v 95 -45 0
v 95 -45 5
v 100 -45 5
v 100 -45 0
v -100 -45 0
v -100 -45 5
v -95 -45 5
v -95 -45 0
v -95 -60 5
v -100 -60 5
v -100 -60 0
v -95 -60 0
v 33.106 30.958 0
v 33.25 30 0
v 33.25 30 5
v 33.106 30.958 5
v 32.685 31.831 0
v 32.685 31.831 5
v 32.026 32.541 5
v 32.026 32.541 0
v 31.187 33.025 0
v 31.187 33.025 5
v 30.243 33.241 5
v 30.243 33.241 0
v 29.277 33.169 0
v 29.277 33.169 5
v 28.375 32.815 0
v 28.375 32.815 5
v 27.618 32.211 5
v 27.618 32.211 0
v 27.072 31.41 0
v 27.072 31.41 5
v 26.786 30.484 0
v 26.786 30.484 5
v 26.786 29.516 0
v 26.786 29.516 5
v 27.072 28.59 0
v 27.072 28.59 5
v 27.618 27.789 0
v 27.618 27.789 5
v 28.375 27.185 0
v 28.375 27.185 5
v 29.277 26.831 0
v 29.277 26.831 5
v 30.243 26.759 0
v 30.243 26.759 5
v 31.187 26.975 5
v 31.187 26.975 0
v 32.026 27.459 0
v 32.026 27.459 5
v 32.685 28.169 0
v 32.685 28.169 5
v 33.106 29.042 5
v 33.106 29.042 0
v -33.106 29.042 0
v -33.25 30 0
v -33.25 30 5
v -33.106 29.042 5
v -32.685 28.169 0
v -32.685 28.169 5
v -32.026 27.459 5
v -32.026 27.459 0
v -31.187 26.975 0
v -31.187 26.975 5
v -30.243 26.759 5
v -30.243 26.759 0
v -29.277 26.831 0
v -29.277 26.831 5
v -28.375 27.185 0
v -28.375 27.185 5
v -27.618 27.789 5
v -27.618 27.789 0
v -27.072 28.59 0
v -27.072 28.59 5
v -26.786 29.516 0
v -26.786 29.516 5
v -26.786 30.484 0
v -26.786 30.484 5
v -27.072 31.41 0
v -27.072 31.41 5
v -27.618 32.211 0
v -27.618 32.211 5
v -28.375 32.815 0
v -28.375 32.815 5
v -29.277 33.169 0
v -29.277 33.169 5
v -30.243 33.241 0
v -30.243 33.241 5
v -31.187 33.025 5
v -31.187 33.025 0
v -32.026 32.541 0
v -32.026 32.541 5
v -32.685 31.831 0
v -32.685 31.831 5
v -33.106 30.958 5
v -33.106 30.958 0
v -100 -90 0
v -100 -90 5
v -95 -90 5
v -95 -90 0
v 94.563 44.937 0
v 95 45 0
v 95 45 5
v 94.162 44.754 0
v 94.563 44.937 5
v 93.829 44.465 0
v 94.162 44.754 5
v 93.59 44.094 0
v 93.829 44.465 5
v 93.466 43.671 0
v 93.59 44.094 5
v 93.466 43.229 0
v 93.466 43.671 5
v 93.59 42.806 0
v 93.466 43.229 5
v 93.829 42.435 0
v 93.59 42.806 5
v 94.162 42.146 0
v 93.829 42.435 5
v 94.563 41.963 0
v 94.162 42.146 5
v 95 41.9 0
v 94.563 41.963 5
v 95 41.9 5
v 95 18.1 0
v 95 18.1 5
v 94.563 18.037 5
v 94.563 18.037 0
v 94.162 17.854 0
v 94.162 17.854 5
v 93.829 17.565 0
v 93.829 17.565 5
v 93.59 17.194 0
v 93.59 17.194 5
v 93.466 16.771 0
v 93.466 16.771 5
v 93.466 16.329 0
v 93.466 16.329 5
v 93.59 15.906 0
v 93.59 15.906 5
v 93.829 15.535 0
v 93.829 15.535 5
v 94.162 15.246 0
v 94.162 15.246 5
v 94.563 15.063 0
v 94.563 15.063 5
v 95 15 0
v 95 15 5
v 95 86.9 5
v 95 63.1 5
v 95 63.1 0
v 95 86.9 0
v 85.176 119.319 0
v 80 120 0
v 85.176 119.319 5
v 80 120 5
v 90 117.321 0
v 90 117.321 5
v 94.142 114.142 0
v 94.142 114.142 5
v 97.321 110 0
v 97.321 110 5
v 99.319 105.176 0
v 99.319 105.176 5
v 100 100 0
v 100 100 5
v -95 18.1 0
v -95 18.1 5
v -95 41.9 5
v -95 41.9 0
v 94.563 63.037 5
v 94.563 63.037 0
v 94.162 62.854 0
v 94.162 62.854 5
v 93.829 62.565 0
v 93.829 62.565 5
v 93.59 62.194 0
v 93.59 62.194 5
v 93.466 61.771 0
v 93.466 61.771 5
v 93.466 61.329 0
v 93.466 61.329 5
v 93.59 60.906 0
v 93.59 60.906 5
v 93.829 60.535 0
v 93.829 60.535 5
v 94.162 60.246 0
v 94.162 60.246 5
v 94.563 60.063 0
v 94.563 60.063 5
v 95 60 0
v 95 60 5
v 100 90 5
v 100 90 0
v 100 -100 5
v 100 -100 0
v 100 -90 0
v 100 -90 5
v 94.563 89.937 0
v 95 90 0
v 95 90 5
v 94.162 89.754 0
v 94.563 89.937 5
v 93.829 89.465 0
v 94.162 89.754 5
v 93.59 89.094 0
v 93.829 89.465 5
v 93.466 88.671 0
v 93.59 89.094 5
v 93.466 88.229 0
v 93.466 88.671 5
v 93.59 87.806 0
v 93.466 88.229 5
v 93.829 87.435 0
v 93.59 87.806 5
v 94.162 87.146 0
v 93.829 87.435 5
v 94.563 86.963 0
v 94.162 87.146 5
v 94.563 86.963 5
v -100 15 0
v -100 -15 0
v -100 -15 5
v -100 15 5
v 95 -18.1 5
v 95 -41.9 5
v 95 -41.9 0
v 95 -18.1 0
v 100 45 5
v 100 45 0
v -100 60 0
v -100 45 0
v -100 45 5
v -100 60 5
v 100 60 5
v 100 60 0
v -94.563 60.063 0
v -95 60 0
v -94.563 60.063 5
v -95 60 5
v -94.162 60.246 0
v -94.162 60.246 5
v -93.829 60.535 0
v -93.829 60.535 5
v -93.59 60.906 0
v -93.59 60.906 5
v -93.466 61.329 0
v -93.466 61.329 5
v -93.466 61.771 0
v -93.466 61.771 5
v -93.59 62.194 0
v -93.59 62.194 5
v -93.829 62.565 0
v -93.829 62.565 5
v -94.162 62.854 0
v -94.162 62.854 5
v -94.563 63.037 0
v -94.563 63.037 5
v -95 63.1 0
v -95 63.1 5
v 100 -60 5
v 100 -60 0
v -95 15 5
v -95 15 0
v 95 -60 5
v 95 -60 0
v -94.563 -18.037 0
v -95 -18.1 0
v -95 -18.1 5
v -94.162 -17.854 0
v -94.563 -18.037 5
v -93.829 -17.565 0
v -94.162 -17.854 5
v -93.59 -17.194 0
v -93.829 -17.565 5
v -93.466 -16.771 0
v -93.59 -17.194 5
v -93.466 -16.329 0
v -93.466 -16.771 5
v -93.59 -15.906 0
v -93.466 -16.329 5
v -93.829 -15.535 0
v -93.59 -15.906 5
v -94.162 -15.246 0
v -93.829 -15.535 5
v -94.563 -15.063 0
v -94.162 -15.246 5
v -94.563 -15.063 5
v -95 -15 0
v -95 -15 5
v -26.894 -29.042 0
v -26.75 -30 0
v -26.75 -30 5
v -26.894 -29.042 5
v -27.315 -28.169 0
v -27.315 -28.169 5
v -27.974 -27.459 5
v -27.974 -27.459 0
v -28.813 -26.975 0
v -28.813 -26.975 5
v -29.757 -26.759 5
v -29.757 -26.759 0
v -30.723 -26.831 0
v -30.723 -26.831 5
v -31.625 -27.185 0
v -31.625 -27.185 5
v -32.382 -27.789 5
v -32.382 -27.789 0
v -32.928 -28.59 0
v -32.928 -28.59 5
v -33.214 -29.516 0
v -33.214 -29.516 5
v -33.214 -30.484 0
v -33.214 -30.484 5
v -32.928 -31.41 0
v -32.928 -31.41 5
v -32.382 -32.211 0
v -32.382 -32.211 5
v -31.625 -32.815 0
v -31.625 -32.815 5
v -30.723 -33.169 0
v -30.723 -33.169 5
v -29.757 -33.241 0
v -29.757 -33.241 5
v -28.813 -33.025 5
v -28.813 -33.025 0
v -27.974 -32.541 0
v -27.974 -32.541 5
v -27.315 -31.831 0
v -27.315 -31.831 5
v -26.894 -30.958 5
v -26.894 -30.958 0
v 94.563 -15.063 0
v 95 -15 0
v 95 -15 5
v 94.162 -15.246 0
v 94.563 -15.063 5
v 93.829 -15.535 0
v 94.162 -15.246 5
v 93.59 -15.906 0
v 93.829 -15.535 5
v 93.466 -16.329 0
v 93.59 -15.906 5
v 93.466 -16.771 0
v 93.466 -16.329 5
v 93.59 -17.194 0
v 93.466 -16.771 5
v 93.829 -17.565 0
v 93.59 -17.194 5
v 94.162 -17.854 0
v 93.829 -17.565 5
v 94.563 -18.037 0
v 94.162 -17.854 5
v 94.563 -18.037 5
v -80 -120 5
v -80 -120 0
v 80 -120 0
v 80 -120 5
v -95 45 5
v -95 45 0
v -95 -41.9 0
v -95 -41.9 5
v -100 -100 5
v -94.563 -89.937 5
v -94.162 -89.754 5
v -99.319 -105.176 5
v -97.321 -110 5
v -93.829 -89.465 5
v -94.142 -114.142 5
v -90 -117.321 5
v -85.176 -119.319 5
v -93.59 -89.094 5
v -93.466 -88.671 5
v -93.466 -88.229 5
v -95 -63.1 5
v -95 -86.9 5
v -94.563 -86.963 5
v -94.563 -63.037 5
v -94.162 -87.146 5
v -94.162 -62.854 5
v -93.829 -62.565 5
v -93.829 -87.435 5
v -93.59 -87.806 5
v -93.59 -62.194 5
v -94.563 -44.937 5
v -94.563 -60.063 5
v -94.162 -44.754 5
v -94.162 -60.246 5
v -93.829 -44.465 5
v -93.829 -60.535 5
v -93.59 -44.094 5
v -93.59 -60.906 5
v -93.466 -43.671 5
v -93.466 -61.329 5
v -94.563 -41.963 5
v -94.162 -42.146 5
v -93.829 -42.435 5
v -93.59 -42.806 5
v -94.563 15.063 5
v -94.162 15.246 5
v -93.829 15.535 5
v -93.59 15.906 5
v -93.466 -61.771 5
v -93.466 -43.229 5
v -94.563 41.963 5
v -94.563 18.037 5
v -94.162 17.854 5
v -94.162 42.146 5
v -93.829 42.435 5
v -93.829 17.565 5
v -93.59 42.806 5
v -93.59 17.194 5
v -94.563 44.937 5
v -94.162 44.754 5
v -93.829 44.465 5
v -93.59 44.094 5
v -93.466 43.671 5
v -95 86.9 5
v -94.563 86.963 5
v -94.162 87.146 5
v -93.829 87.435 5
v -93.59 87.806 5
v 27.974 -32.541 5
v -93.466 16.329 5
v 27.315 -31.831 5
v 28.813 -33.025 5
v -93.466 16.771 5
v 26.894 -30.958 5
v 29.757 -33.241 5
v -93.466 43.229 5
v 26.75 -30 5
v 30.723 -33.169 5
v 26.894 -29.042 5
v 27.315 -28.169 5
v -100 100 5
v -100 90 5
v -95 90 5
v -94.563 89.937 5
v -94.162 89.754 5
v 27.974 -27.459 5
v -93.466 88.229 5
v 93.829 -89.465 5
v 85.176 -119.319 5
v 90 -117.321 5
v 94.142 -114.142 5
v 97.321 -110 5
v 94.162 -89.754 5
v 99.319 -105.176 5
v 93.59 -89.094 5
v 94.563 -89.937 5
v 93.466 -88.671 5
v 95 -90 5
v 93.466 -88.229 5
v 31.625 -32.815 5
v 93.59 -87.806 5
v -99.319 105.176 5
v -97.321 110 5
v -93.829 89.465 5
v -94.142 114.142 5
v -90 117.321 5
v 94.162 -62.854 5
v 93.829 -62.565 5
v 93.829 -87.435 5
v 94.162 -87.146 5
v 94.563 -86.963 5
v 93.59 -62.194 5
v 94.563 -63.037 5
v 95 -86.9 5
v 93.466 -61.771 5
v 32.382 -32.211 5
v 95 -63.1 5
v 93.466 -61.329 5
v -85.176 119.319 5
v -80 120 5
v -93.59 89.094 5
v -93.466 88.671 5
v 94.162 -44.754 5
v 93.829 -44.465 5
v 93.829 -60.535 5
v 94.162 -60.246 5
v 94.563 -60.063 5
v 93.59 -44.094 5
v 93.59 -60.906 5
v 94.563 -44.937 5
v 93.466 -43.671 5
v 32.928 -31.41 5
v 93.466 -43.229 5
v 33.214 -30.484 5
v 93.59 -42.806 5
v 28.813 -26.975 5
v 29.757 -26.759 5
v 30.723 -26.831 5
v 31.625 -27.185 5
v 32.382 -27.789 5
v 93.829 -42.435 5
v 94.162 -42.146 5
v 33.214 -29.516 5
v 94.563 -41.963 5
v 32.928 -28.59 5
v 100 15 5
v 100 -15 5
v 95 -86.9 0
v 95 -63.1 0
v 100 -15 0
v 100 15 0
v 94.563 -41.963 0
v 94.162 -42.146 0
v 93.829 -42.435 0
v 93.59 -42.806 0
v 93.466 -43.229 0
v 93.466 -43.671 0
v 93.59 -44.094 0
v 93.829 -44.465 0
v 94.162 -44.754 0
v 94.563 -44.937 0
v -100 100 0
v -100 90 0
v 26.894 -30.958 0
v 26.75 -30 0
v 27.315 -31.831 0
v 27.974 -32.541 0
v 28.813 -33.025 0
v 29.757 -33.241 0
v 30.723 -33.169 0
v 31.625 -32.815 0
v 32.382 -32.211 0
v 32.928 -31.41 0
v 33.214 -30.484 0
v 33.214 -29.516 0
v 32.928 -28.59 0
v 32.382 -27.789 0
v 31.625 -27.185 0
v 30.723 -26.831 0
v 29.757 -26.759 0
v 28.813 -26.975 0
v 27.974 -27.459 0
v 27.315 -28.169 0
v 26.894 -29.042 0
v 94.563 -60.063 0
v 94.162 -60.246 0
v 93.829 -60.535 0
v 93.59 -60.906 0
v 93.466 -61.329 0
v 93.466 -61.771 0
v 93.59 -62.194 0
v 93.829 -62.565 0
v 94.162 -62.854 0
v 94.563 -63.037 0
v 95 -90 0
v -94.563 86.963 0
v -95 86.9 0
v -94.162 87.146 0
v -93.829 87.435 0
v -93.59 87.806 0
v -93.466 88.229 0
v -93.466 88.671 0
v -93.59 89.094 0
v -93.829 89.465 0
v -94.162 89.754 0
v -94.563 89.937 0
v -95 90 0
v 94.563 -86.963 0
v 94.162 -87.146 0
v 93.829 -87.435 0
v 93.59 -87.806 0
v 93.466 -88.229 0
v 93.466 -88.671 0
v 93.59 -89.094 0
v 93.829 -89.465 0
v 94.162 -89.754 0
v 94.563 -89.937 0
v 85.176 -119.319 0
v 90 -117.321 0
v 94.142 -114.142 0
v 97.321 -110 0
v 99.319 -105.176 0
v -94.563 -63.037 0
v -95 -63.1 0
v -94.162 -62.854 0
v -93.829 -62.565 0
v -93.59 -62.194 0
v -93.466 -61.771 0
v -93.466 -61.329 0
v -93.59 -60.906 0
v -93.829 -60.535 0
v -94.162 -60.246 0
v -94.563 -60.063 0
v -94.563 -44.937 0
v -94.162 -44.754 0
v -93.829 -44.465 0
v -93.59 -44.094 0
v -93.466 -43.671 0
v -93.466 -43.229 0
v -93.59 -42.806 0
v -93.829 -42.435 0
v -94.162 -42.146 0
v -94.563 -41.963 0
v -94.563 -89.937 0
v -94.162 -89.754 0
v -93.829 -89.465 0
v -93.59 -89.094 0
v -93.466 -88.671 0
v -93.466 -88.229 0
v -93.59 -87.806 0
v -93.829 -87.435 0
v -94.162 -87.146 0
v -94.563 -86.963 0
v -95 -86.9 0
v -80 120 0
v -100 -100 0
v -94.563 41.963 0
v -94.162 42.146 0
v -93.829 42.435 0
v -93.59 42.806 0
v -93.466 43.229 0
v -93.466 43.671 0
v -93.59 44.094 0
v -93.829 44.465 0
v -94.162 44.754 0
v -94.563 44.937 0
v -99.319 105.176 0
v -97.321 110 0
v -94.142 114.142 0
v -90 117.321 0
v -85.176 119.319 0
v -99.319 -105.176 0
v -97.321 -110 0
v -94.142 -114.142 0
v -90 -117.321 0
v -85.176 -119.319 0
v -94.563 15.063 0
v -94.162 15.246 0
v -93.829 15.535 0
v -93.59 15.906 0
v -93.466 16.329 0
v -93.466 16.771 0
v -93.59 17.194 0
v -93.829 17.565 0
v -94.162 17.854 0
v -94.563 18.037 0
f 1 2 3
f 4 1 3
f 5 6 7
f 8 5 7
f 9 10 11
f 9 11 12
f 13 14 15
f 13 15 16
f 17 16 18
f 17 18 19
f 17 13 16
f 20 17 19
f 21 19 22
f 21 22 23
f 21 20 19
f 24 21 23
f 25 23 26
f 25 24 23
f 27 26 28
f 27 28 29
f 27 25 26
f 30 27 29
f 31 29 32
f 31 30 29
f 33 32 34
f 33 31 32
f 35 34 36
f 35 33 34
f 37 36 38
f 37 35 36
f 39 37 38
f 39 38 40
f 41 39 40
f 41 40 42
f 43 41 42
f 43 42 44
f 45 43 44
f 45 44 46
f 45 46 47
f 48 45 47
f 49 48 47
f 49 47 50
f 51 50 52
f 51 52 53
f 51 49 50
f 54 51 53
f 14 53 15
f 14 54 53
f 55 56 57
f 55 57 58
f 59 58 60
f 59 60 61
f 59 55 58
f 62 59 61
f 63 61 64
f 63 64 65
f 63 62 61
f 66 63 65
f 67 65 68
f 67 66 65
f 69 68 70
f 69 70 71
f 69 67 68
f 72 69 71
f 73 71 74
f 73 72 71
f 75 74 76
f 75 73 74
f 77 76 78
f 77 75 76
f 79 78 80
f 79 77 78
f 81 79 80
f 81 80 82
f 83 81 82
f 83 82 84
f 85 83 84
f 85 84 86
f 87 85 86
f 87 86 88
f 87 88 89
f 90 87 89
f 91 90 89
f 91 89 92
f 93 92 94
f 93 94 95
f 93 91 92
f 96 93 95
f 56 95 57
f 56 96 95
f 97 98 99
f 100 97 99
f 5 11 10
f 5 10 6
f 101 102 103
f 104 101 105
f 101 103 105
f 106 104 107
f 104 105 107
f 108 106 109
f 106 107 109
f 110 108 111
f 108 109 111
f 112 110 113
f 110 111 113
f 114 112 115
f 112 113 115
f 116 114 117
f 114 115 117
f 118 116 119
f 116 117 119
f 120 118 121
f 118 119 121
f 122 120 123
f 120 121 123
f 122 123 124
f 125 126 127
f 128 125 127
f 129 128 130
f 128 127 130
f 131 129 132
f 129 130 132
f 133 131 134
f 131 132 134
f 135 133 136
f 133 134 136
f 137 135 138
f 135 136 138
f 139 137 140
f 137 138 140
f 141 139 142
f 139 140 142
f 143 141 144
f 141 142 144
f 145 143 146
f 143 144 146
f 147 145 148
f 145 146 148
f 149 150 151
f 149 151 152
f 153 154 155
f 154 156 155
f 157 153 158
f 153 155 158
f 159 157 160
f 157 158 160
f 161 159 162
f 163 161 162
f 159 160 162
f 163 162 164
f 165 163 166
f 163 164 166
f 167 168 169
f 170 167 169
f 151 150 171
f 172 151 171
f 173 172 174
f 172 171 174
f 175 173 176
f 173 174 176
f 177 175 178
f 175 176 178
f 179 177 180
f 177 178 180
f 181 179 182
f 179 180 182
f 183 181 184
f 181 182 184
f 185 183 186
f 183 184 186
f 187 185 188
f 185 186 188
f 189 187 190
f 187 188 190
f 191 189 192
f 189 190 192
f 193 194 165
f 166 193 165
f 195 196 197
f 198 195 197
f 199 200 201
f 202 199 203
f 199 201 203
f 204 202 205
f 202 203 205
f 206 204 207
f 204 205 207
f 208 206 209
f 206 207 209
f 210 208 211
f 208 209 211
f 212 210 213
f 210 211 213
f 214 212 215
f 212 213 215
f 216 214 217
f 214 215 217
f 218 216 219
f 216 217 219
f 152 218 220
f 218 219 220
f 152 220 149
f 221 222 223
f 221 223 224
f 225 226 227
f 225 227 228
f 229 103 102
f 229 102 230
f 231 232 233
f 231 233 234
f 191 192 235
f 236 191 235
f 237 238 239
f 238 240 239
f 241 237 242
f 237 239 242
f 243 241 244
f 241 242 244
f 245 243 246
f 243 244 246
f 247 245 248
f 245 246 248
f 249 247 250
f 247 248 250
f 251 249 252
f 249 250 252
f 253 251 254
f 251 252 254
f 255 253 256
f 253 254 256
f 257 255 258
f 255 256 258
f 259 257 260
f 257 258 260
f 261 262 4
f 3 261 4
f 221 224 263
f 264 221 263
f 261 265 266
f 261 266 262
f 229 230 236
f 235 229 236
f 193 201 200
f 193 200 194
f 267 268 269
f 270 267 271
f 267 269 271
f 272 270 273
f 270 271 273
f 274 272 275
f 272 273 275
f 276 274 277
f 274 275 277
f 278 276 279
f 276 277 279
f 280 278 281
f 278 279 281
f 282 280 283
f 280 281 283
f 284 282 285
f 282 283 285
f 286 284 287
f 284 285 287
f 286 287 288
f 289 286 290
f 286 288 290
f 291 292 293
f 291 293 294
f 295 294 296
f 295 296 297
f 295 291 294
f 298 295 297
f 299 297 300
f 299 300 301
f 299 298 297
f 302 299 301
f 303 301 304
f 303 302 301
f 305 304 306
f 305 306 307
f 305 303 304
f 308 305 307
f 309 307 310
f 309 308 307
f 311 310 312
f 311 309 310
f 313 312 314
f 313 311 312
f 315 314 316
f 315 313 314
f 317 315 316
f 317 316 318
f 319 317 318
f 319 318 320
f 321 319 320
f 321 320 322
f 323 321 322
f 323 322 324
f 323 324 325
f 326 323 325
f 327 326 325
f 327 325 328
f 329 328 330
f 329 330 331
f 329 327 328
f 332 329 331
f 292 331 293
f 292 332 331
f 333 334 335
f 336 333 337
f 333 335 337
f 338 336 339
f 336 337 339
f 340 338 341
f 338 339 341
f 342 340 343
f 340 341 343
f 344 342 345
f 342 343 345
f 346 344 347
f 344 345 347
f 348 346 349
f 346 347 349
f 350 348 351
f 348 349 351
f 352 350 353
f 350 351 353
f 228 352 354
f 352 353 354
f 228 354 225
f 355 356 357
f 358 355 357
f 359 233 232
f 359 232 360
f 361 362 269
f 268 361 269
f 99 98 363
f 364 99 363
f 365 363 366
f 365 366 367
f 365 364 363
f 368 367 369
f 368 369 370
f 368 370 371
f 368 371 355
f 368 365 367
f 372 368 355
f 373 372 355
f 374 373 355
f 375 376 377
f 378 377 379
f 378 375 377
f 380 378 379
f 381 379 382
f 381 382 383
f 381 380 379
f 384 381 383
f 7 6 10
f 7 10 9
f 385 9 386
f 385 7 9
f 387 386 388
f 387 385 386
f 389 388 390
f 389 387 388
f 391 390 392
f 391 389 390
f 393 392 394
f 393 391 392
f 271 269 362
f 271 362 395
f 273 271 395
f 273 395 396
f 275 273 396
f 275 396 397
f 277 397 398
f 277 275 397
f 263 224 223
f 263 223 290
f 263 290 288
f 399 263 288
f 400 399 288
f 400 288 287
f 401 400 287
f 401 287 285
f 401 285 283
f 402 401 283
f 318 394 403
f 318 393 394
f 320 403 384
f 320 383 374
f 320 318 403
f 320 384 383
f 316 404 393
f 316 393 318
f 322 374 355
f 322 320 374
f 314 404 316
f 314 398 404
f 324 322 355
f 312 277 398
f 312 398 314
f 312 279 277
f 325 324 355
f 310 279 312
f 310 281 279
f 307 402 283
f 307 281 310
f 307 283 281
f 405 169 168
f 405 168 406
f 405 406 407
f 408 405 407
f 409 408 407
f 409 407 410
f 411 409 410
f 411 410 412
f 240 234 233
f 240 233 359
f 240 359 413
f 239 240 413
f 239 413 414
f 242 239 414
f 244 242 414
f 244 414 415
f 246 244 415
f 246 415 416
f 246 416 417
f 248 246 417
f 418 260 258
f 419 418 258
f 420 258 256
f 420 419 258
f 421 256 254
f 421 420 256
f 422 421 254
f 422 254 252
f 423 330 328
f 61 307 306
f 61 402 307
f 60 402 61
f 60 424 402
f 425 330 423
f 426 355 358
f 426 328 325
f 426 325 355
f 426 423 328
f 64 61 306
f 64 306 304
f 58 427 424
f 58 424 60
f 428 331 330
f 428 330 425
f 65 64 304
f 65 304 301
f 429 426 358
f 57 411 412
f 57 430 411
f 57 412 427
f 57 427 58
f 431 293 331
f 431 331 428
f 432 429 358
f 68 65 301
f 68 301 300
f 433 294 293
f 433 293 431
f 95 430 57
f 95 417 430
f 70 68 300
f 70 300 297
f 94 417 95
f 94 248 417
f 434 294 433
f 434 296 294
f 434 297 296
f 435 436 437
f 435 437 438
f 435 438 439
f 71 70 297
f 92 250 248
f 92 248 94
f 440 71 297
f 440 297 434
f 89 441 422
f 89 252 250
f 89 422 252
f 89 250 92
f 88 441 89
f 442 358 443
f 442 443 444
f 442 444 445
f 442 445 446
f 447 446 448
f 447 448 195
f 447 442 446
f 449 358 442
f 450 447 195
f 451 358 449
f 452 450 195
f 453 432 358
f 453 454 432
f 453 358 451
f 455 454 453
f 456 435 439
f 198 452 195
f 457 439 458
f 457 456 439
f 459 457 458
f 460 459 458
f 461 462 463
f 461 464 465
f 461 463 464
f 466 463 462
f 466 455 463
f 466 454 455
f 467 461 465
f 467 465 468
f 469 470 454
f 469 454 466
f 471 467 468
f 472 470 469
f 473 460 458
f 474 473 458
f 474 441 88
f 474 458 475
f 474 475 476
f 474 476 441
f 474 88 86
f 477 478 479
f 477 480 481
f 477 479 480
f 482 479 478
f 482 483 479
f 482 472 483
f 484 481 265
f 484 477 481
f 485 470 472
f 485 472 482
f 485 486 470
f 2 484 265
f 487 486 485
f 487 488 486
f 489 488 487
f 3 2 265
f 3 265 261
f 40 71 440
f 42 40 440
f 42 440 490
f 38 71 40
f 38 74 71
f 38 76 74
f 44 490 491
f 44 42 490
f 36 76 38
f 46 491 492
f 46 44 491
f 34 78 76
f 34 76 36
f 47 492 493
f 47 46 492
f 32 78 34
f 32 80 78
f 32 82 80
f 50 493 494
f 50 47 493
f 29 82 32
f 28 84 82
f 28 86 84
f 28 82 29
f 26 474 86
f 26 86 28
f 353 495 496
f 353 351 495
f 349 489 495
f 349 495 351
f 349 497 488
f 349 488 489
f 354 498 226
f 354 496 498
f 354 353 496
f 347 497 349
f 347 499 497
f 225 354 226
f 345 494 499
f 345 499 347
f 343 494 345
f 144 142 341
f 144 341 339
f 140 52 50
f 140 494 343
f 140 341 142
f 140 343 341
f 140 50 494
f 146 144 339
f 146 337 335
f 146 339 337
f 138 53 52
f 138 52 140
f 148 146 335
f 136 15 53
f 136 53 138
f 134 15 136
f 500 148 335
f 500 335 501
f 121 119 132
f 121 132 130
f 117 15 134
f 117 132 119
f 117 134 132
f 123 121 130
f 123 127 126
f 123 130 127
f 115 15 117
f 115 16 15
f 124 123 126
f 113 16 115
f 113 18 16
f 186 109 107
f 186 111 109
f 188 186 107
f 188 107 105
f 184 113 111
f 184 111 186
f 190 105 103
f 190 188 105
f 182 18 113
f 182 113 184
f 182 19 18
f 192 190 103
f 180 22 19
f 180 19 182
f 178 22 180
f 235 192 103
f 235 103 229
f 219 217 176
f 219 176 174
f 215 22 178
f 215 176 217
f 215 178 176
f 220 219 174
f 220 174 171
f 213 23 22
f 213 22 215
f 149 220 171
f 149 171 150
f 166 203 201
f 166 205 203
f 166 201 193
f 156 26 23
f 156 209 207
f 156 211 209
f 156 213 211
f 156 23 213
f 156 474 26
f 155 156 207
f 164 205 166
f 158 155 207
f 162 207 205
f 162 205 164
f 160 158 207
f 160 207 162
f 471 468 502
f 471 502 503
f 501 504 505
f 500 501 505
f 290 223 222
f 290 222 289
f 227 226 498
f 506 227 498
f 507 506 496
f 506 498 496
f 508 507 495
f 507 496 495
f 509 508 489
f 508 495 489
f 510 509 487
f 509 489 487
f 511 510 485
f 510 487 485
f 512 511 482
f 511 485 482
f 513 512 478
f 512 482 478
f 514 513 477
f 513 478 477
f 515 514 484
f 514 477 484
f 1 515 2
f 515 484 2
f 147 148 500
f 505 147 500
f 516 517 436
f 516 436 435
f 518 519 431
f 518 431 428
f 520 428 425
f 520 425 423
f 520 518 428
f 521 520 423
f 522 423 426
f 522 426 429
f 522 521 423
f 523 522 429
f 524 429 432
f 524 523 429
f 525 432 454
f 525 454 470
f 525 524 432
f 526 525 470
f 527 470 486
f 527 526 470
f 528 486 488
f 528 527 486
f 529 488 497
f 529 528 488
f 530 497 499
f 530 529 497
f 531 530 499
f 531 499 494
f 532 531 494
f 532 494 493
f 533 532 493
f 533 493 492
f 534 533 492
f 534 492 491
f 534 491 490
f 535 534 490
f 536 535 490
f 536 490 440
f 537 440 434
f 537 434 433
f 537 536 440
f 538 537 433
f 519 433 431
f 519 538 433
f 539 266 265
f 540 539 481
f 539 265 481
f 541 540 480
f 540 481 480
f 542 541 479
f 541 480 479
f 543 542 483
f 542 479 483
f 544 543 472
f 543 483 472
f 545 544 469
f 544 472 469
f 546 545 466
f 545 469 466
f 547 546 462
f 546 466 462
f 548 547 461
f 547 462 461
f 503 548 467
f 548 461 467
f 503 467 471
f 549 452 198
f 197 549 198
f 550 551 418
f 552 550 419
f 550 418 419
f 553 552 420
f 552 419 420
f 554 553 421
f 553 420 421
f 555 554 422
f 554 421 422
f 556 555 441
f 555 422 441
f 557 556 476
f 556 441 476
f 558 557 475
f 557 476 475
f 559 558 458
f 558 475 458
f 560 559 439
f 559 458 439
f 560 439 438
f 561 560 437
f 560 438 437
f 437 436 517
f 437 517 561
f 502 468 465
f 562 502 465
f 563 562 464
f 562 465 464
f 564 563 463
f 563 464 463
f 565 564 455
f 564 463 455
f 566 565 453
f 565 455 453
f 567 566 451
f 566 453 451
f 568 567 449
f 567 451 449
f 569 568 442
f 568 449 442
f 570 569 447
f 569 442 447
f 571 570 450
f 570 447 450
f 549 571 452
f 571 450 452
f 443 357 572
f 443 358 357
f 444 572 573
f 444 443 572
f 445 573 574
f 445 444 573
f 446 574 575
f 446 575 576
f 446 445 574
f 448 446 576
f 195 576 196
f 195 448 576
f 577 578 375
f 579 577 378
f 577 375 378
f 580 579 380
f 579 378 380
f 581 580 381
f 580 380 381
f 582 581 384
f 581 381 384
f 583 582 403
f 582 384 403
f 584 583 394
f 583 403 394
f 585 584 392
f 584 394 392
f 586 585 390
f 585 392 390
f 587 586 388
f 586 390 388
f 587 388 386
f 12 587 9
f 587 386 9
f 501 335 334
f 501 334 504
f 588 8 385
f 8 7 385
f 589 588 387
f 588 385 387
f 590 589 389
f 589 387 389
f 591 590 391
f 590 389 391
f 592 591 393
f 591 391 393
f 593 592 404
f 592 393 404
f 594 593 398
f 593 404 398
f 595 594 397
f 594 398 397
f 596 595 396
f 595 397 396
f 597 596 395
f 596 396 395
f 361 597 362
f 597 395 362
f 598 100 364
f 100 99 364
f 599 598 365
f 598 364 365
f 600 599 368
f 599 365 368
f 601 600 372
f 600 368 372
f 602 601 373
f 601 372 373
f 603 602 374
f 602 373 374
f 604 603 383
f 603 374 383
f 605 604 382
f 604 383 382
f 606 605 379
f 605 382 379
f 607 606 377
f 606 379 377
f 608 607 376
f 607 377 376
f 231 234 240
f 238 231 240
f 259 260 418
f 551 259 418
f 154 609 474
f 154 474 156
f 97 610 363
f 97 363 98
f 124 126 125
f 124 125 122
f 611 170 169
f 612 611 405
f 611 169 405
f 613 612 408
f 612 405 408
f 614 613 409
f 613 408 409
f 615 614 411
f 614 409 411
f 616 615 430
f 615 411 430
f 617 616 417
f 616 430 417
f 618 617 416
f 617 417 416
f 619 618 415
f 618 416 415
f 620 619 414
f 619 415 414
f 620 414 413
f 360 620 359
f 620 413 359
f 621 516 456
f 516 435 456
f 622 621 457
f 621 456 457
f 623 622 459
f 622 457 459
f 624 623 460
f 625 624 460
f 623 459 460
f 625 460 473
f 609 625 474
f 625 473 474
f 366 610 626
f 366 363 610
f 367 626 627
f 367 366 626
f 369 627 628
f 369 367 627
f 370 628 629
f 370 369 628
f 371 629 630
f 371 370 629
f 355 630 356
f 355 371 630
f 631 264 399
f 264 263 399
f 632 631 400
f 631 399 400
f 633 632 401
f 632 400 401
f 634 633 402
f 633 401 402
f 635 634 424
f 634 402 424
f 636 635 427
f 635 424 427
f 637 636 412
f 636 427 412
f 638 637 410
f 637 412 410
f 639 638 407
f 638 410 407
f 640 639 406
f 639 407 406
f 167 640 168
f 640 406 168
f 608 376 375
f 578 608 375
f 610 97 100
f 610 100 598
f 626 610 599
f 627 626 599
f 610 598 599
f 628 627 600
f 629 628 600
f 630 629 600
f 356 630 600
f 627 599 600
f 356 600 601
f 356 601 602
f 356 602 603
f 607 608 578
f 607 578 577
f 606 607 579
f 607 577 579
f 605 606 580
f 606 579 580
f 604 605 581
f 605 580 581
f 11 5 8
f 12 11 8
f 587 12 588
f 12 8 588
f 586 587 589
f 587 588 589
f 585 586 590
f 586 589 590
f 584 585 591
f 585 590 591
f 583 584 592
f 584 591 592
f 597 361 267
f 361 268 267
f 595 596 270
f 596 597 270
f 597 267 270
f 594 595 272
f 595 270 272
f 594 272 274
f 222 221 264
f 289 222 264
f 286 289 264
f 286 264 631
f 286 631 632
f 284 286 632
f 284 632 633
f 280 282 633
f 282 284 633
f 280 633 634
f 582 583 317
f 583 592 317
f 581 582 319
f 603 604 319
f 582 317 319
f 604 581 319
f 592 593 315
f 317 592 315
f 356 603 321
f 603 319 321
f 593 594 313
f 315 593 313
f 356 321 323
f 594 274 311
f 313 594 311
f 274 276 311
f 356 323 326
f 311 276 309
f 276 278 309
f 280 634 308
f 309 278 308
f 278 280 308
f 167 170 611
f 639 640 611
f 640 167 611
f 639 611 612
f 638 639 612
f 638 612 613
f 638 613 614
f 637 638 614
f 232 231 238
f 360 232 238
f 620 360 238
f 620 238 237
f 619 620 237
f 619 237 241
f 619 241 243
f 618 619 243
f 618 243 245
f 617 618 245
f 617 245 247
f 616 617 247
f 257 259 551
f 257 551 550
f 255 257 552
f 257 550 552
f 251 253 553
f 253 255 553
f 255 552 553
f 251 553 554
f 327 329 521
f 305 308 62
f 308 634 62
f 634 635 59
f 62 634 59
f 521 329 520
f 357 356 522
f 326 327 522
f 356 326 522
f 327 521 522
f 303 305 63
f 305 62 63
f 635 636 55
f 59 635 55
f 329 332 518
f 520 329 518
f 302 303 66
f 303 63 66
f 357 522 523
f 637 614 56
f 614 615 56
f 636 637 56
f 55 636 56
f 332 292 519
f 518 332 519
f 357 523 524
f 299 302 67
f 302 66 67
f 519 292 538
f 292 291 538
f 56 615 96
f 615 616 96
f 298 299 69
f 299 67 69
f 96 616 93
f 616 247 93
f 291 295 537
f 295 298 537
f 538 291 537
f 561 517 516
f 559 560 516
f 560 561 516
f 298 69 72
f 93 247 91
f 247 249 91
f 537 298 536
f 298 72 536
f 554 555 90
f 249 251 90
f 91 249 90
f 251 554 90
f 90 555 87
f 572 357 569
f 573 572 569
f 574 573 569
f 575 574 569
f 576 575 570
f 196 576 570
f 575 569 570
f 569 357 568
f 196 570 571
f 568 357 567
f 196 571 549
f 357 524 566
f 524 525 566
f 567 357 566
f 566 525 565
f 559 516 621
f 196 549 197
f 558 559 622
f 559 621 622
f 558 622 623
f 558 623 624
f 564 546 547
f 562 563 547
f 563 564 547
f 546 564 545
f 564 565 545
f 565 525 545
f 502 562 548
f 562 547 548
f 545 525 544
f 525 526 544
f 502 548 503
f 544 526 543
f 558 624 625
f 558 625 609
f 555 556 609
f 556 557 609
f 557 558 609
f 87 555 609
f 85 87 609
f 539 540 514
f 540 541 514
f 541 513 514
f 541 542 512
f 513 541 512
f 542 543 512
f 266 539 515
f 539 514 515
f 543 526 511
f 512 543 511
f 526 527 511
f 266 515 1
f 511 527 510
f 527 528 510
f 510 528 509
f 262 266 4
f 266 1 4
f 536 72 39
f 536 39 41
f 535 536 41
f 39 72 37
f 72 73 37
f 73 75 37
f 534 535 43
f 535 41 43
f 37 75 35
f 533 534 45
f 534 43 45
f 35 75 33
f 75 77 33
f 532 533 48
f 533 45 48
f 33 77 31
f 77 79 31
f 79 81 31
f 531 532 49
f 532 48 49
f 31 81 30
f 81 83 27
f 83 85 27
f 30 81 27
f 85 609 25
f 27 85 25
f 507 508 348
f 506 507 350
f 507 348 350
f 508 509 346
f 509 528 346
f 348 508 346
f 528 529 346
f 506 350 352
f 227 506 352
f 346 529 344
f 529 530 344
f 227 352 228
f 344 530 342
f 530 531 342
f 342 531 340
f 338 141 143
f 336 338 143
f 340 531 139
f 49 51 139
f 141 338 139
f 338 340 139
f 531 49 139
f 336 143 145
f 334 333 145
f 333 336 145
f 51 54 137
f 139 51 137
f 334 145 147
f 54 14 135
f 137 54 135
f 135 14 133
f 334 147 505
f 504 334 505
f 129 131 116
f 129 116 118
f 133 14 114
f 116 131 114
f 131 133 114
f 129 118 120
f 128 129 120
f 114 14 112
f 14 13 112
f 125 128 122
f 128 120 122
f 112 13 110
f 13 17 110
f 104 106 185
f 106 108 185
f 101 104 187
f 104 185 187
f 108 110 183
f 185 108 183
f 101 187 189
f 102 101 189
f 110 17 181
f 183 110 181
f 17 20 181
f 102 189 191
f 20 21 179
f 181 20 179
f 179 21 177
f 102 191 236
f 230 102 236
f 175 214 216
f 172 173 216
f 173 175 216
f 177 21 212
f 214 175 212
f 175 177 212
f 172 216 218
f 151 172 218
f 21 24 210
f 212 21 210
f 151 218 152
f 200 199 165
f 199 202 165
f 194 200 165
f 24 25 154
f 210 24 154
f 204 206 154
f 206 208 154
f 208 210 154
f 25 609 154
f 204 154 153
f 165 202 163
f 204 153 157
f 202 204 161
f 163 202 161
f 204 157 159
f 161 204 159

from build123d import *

# Parameters (mm, degrees)
SKETCH_1_W          = 200
SKETCH_1_H          = 240
SKETCH_1_R          = 3.25
EXTRUDE_1_DEPTH     = 5
FILLET_1_R          = 20
SKETCH_3_W          = 5
SKETCH_3_H          = 30
CUT_EXTRUDE_1_DEPTH = 39
SKETCH_4_R          = 1.55
CUT_EXTRUDE_2_DEPTH = 5


with BuildPart() as part:
    # 草图1 → 凸台-拉伸1 (new body)
    with BuildSketch(Plane.XY):
        Rectangle(SKETCH_1_W, SKETCH_1_H)
        with Locations((30, 30)):
            Circle(SKETCH_1_R, mode=Mode.SUBTRACT)
        with Locations(Location((30, -30, 0), (0, 0, 180))):
            Circle(SKETCH_1_R, mode=Mode.SUBTRACT)
        with Locations(Location((-30, 30, 0), (0, 0, 180))):
            Circle(SKETCH_1_R, mode=Mode.SUBTRACT)
        with Locations((-30, -30)):
            Circle(SKETCH_1_R, mode=Mode.SUBTRACT)
    extrude(amount=EXTRUDE_1_DEPTH)

    # 圆角1
    fillet_1_edges = [part.edges().sort_by_distance(p)[0] for p in [
        (-100, 120, 2.5),
        (-100, -120, 2.5),
        (100, -120, 2.5),
        (100, 120, 2.5),
    ]]
    fillet(fillet_1_edges, radius=FILLET_1_R)

    # 草图3 → 切除-拉伸1 (cut)
    with BuildSketch(Plane.XY.offset(5)):
        with Locations((97.5, 75)):
            Rectangle(SKETCH_3_W, SKETCH_3_H)
        with Locations((97.5, -30)):
            Rectangle(SKETCH_3_W, SKETCH_3_H)
        with Locations((97.5, 30)):
            Rectangle(SKETCH_3_W, SKETCH_3_H)
        with Locations((97.5, -75)):
            Rectangle(SKETCH_3_W, SKETCH_3_H)
        with Locations((-97.5, -75)):
            Rectangle(SKETCH_3_W, SKETCH_3_H)
        with Locations((-97.5, -30)):
            Rectangle(SKETCH_3_W, SKETCH_3_H)
        with Locations((-97.5, 30)):
            Rectangle(SKETCH_3_W, SKETCH_3_H)
        with Locations((-97.5, 75)):
            Rectangle(SKETCH_3_W, SKETCH_3_H)
    extrude(amount=-CUT_EXTRUDE_1_DEPTH, mode=Mode.SUBTRACT)

    # 草图4 → 切除-拉伸2 (cut)
    with BuildSketch(Plane.XY.offset(5)):
        with Locations((95, 88.45)):
            Circle(SKETCH_4_R)
        with Locations((95, 61.55)):
            Circle(SKETCH_4_R)
        with Locations((95, 43.45)):
            Circle(SKETCH_4_R)
        with Locations((95, 16.55)):
            Circle(SKETCH_4_R)
        with Locations((95, -16.55)):
            Circle(SKETCH_4_R)
        with Locations((95, -43.45)):
            Circle(SKETCH_4_R)
        with Locations((95, -61.55)):
            Circle(SKETCH_4_R)
        with Locations((95, -88.45)):
            Circle(SKETCH_4_R)
        with Locations((-95, -88.45)):
            Circle(SKETCH_4_R)
        with Locations((-95, -61.55)):
            Circle(SKETCH_4_R)
        with Locations((-95, -43.45)):
            Circle(SKETCH_4_R)
        with Locations((-95, -16.55)):
            Circle(SKETCH_4_R)
        with Locations((-95, 16.55)):
            Circle(SKETCH_4_R)
        with Locations((-95, 43.45)):
            Circle(SKETCH_4_R)
        with Locations((-95, 61.55)):
            Circle(SKETCH_4_R)
        with Locations((-95, 88.45)):
            Circle(SKETCH_4_R)
    extrude(amount=-CUT_EXTRUDE_2_DEPTH, mode=Mode.SUBTRACT)


solid = part.part
